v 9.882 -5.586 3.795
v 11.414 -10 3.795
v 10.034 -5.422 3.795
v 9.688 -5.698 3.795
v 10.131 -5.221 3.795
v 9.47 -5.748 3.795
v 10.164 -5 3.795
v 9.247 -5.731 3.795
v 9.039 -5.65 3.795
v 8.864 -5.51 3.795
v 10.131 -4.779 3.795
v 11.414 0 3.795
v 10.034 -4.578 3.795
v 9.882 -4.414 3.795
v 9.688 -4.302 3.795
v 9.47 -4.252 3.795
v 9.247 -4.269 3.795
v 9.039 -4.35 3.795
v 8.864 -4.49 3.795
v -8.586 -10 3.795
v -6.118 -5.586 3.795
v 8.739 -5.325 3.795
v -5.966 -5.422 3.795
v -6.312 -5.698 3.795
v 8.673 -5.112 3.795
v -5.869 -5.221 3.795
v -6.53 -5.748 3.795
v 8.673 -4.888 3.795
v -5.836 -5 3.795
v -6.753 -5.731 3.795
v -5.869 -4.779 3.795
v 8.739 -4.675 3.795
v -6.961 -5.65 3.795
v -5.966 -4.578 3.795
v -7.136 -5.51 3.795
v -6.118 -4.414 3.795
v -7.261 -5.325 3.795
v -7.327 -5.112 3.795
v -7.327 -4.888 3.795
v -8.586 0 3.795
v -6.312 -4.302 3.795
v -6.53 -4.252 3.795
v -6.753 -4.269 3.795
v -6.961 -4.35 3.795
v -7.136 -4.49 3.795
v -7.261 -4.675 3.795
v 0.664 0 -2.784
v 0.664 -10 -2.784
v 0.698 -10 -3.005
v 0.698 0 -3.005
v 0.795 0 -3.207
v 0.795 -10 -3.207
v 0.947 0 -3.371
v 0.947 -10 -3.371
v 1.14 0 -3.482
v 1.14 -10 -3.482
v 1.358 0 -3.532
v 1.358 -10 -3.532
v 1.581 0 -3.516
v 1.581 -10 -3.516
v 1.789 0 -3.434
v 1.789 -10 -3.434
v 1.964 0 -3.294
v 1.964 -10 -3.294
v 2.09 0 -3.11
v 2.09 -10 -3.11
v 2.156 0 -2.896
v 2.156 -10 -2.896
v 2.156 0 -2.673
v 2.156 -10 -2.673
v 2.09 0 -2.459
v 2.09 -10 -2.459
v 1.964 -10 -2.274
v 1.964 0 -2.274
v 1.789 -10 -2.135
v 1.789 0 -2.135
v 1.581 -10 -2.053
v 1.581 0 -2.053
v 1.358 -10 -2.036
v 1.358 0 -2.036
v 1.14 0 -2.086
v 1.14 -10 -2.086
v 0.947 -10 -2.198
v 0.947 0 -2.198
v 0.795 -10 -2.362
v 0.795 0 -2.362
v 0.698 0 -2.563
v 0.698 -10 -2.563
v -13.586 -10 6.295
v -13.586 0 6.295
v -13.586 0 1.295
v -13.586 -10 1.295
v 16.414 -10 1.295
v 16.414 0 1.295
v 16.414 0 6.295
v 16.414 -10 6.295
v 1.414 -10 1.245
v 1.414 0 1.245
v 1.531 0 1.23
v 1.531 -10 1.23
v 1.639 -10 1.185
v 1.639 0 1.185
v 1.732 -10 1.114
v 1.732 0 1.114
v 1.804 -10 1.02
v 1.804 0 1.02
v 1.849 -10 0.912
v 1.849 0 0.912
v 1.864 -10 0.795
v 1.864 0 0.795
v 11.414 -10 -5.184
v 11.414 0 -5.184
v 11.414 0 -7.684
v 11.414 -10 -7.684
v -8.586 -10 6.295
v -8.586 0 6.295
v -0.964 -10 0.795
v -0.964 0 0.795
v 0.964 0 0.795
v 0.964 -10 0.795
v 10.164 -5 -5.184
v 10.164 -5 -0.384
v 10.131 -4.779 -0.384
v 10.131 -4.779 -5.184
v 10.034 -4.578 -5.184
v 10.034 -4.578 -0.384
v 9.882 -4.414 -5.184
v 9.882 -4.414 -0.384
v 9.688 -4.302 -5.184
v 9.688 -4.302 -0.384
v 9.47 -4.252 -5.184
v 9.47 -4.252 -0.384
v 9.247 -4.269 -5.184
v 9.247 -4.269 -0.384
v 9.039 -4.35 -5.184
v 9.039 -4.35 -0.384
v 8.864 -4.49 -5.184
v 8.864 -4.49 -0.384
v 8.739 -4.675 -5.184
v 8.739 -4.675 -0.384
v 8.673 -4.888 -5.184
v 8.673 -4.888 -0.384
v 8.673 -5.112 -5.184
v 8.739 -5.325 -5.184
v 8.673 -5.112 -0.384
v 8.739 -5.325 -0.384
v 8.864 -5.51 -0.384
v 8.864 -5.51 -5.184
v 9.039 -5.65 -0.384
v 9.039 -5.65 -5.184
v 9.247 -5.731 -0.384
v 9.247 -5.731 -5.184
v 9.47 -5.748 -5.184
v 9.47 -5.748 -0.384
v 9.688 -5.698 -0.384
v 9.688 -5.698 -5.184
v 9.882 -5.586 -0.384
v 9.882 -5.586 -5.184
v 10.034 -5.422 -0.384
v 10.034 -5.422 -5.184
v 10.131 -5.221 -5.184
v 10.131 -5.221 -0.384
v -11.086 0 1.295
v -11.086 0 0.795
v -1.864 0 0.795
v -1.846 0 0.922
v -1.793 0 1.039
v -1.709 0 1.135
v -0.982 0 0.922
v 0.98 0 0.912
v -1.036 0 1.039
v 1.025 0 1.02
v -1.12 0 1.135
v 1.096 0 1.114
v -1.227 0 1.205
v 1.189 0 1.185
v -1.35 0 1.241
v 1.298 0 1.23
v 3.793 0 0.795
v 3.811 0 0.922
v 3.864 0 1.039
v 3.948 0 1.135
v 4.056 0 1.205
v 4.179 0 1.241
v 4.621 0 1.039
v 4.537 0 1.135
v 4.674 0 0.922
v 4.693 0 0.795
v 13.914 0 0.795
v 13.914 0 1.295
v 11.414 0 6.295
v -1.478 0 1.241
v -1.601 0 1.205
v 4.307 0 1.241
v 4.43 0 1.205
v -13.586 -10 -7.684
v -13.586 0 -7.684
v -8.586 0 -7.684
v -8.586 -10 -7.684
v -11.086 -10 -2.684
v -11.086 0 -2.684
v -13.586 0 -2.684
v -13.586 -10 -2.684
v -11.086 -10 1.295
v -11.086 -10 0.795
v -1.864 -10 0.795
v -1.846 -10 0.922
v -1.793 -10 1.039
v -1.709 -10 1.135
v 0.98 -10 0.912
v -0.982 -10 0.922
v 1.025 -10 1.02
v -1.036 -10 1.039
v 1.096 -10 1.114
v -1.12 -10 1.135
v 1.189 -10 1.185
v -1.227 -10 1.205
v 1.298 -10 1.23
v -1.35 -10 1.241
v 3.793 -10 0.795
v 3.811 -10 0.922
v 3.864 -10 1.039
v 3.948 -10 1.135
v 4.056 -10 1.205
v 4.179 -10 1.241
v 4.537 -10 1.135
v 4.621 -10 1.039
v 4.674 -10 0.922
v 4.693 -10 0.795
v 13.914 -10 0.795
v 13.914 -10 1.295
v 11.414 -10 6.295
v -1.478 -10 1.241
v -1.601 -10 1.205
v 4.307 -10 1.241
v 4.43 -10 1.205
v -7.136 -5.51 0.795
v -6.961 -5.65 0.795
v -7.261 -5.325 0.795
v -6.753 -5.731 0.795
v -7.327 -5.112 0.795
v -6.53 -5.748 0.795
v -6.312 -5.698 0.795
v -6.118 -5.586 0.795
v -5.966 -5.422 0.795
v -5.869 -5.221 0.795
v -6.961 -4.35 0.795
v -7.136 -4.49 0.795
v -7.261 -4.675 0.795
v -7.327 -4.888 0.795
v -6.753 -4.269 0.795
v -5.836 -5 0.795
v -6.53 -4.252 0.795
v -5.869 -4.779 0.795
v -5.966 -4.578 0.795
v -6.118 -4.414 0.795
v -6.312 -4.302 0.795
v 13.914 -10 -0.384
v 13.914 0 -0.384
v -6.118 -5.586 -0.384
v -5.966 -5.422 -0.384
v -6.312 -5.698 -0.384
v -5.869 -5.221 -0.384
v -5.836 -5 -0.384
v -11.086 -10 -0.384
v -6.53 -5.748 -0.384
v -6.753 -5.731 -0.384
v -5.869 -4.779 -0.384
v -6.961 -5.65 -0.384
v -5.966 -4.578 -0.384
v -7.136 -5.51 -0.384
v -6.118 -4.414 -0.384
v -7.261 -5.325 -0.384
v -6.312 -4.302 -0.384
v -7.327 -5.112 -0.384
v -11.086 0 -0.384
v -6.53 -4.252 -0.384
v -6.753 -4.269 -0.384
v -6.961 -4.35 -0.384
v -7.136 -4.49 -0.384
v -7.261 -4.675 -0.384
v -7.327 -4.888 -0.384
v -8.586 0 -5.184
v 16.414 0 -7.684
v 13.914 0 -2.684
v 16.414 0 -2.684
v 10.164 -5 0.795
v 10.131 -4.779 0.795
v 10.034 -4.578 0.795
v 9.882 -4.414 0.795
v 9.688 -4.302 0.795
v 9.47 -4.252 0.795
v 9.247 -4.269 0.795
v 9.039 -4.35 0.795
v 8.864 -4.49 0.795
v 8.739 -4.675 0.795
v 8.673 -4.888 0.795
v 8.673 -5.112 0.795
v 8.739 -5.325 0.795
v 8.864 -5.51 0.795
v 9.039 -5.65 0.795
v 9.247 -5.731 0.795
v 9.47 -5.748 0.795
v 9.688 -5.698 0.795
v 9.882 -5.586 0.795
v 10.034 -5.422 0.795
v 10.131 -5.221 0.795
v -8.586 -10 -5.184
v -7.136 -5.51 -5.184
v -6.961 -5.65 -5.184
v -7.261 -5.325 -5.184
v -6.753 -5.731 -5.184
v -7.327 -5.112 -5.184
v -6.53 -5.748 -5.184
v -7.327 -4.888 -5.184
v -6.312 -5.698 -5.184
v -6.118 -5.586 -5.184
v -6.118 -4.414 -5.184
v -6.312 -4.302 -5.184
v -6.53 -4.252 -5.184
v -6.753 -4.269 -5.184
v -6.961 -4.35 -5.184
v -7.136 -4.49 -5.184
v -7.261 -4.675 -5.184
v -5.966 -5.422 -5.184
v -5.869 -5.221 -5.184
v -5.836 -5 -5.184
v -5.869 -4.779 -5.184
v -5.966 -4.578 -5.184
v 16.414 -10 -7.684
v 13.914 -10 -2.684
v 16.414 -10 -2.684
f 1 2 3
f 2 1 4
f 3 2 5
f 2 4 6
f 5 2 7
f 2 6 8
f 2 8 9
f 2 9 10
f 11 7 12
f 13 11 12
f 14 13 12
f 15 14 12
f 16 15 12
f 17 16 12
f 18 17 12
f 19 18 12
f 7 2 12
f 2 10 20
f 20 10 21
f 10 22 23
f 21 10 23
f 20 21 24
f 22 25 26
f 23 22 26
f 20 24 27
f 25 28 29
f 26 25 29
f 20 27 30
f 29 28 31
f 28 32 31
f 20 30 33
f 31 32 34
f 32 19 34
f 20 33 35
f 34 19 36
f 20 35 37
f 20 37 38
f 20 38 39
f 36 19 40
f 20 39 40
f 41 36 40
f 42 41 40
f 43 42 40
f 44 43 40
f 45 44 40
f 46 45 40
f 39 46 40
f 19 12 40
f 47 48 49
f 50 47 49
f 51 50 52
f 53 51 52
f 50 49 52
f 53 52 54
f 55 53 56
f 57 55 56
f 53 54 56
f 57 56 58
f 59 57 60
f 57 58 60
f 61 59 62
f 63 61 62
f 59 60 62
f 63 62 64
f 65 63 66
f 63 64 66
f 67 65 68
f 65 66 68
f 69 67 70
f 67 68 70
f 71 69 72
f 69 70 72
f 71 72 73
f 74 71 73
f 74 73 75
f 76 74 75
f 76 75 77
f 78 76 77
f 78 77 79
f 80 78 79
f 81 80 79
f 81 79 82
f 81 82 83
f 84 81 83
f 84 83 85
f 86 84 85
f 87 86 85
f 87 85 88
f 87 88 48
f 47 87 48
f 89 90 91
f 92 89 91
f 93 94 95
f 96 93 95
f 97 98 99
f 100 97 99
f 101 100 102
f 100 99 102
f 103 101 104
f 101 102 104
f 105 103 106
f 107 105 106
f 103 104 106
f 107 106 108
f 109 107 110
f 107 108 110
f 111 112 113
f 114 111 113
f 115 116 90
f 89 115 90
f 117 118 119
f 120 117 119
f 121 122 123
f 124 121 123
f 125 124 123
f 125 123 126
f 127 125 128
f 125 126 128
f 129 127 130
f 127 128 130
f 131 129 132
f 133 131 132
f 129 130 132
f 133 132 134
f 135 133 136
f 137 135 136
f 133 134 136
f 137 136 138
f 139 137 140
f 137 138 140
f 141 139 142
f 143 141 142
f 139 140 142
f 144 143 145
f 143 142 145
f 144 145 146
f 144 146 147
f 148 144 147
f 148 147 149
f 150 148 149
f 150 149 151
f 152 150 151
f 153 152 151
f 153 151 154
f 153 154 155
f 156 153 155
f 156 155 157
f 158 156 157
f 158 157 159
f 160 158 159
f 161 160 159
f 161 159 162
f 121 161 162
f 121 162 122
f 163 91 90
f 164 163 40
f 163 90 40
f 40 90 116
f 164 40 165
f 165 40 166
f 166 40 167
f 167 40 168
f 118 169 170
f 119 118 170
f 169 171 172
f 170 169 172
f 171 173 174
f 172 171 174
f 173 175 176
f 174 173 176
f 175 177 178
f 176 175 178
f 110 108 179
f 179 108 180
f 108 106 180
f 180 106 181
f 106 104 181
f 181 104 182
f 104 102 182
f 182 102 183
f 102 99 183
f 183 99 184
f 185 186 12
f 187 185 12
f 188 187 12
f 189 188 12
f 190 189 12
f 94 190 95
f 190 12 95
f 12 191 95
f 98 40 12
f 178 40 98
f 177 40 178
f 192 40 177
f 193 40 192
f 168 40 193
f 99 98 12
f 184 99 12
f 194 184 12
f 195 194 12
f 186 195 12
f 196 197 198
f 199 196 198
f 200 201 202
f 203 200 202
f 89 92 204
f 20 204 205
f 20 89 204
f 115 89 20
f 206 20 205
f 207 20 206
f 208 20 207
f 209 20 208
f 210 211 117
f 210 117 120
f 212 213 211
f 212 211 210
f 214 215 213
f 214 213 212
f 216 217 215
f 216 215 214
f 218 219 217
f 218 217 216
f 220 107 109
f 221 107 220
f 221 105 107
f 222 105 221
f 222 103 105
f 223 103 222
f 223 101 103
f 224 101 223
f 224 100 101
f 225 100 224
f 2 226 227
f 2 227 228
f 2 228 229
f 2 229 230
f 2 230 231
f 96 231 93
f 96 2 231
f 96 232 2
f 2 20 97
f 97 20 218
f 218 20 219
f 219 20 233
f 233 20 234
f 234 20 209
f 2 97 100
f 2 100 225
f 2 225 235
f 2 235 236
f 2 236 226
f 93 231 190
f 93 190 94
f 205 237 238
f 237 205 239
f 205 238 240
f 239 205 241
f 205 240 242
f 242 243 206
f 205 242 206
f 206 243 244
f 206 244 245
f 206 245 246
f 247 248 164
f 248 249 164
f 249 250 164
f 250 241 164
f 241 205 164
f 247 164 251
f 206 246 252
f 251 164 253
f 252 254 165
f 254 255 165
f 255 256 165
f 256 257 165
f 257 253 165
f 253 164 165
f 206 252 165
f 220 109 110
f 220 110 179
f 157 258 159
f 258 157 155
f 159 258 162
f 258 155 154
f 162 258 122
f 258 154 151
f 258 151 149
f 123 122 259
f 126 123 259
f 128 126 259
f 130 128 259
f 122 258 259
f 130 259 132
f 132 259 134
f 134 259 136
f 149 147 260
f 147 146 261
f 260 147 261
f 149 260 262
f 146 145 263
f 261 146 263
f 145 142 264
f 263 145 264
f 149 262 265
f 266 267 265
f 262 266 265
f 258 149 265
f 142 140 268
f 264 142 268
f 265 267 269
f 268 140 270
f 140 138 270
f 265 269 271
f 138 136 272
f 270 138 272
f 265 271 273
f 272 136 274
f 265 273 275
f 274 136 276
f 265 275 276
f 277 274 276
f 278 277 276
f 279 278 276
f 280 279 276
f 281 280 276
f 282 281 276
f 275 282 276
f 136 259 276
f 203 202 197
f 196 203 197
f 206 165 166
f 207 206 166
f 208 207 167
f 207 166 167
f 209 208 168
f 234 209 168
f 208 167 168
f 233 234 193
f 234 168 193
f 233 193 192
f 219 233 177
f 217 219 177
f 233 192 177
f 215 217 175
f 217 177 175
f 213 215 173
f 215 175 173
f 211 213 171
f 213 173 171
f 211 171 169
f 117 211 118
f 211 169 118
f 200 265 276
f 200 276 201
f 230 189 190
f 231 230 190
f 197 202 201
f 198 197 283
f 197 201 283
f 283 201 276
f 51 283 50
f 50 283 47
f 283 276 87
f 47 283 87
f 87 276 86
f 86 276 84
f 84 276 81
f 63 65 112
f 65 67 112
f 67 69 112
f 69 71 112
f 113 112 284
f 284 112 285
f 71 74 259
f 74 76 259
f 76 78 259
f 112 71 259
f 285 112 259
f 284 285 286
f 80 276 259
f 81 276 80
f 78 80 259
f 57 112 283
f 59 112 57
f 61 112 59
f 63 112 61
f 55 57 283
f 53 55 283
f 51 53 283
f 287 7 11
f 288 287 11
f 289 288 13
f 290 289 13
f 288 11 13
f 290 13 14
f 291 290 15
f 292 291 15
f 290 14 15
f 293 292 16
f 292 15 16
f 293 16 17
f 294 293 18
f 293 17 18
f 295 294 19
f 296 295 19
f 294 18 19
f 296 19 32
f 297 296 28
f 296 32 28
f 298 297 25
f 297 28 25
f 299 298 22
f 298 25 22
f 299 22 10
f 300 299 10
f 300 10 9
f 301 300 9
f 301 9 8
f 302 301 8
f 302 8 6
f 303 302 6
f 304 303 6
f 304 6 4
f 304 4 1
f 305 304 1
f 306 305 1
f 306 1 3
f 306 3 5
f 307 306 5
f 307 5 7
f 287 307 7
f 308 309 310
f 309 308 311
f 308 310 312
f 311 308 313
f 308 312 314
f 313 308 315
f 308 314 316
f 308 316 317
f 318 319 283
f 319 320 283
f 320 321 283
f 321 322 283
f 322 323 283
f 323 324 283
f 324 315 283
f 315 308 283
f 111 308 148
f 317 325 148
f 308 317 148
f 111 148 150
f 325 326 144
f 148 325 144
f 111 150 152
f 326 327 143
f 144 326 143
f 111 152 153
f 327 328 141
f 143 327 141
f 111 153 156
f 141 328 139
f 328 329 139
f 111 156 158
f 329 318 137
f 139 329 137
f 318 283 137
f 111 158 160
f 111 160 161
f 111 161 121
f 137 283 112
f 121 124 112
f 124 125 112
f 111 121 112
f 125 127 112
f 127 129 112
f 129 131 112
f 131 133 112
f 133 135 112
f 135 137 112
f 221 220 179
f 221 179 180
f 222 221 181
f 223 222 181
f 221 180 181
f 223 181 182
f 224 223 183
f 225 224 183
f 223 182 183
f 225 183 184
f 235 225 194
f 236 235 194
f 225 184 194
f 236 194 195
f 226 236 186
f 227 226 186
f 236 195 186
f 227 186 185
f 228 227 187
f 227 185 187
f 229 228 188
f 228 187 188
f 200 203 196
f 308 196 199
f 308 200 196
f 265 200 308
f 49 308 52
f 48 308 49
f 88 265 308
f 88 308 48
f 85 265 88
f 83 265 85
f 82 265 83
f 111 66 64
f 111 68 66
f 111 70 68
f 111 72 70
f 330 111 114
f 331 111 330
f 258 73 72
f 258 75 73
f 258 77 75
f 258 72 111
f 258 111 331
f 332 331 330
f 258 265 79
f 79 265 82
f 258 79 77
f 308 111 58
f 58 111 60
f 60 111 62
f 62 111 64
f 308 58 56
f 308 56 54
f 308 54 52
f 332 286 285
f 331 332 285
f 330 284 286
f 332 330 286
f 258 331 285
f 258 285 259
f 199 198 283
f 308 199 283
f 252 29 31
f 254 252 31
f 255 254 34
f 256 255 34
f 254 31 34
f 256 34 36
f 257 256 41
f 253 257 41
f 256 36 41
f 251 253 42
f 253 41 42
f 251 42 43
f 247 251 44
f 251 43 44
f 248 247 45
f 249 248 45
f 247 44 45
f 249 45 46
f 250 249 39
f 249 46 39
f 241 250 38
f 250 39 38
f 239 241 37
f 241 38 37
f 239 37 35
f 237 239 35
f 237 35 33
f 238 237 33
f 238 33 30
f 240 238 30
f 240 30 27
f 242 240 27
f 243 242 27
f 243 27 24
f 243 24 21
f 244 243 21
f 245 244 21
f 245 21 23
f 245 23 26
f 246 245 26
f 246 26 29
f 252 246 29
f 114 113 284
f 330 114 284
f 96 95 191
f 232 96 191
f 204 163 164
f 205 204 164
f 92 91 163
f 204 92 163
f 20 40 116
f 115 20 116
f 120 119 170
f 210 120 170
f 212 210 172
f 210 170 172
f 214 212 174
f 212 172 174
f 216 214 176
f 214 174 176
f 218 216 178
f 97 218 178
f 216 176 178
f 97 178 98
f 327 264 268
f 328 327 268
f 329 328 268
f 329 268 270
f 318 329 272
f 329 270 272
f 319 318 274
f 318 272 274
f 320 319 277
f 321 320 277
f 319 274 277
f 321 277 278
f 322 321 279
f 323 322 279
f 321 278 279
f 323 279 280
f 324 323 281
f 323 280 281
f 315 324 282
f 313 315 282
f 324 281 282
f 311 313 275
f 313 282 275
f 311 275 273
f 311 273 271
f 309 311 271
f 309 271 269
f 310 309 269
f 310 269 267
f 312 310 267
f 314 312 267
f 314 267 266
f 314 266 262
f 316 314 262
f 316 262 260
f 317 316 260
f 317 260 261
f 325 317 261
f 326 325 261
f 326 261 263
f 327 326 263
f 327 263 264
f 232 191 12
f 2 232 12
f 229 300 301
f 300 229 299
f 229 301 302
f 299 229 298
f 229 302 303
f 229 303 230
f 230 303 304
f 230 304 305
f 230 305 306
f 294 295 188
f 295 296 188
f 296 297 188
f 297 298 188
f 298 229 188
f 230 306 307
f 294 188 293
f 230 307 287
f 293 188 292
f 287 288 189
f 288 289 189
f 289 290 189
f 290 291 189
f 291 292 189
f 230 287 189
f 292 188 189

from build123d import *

# Parameters (mm, degrees)
F0_W     = 2.5
F0_H     = 2.5
F1_DEPTH = 10
F2_R     = 0.75
F3_DEPTH = 25
F4_D     = 1.5


with BuildPart() as f1:
    # F0 (on Front) → F1 (new body)
    with BuildSketch(Plane.XZ):
        with BuildLine():
            Line((-11.0857598856, 1.2953278515), (-11.0857598856, 0.7953278515))
            Line((-11.0857598856, 0.7953278515), (-1.8642401144, 0.7953278515))
            ThreePointArc((-1.8642401144, 0.7953278515), (-1.4142401144, 1.2453278515), (-0.9642401144, 0.7953278515))
            Line((-0.9642401144, 0.7953278515), (0.9642401144, 0.7953278515))
            ThreePointArc((0.9642401144, 0.7953278515), (1.0960420629, 1.1135259031), (1.4142401144, 1.2453278515))
            Line((1.4142401144, 1.2453278515), (1.4142401144, 3.7953278515))
            Line((1.4142401144, 3.7953278515), (-8.5857598856, 3.7953278515))
            Line((-8.5857598856, 3.7953278515), (-8.5857598856, 1.2953278515))
            Line((-8.5857598856, 1.2953278515), (-11.0857598856, 1.2953278515))
        make_face()
        with BuildLine():
            Line((1.4142401144, 3.7953278515), (1.4142401144, 1.2453278515))
            ThreePointArc((1.4142401144, 1.2453278515), (1.7324381659, 1.1135259031), (1.8642401144, 0.7953278515))
            Line((1.8642401144, 0.7953278515), (3.7927203432, 0.7953278515))
            ThreePointArc((3.7927203432, 0.7953278515), (4.2427203432, 1.2453278515), (4.6927203432, 0.7953278515))
            Line((4.6927203432, 0.7953278515), (13.9142401144, 0.7953278515))
            Line((13.9142401144, 0.7953278515), (13.9142401144, 1.2953278515))
            Line((13.9142401144, 1.2953278515), (11.4142401144, 1.2953278515))
            Line((11.4142401144, 1.2953278515), (11.4142401144, 3.7953278515))
            Line((11.4142401144, 3.7953278515), (1.4142401144, 3.7953278515))
        make_face()
        Polygon((-13.5857598856, 1.2953278515), (-11.0857598856, 1.2953278515), (-11.0857598856, 3.7953278515), (-8.5857598856, 3.7953278515), (-8.5857598856, 6.2953278515), (-13.5857598856, 6.2953278515), align=None)
        with Locations((-9.8357598856, 2.5453278515)):
            Rectangle(F0_W, F0_H)
        Polygon((11.4142401144, 6.2953278515), (11.4142401144, 3.7953278515), (13.9142401144, 3.7953278515), (13.9142401144, 1.2953278515), (16.4142401144, 1.2953278515), (16.4142401144, 6.2953278515), align=None)
        with Locations((12.6642401144, 2.5453278515)):
            Rectangle(F0_W, F0_H)
    extrude(amount=F1_DEPTH)


with BuildPart() as f1b:
    # F0 (on Front) → F1, piece 2 (new body)
    with BuildSketch(Plane.XZ):
        Polygon((13.9142401144, -0.3843072875), (1.4142401144, -0.3843072875), (1.4142401144, -5.1843072875), (11.4142401144, -5.1843072875), (11.4142401144, -2.6843072875), (13.9142401144, -2.6843072875), align=None)
        with Locations((12.6642401144, -3.9343072875)):
            Rectangle(F0_W, F0_H)
        Polygon((13.9142401144, -5.1843072875), (11.4142401144, -5.1843072875), (11.4142401144, -7.6843072875), (16.4142401144, -7.6843072875), (16.4142401144, -2.6843072875), (13.9142401144, -2.6843072875), align=None)
        Polygon((-11.0857598856, -5.1843072875), (-11.0857598856, -2.6843072875), (-13.5857598856, -2.6843072875), (-13.5857598856, -7.6843072875), (-8.5857598856, -7.6843072875), (-8.5857598856, -5.1843072875), align=None)
        with Locations((-9.8357598856, -3.9343072875)):
            Rectangle(F0_W, F0_H)
        Polygon((1.4142401144, -0.3843072875), (-11.0857598856, -0.3843072875), (-11.0857598856, -2.6843072875), (-8.5857598856, -2.6843072875), (-8.5857598856, -5.1843072875), (1.4142401144, -5.1843072875), align=None)
    extrude(amount=F1_DEPTH)


with BuildPart() as f3_tool:
    # F2 (on face) → F3 (new body)
    with BuildSketch(Plane.XY.offset(3.7953278515)):
        with Locations((-6.5857598856, -5)):
            Circle(F2_R)
        with Locations((9.4142401144, -5)):
            Circle(F2_R)
    extrude(amount=-F3_DEPTH)


with BuildPart() as f1_1:
    add(f1.part)

    # F3: cut by f3_tool
    add(f3_tool.part, mode=Mode.SUBTRACT)


with BuildPart() as f1b_1:
    add(f1b.part)

    # F3: cut by f3_tool
    add(f3_tool.part, mode=Mode.SUBTRACT)

    # F4 (through all)
    with Locations(Plane(origin=(0, 0, 0), x_dir=(1, 0, 0), z_dir=(0, 1, 0))):
        with Locations((1.4142401144, 2.7843072875)):
            Hole(F4_D / 2)


solid = Compound([f1_1.part, f1b_1.part])
